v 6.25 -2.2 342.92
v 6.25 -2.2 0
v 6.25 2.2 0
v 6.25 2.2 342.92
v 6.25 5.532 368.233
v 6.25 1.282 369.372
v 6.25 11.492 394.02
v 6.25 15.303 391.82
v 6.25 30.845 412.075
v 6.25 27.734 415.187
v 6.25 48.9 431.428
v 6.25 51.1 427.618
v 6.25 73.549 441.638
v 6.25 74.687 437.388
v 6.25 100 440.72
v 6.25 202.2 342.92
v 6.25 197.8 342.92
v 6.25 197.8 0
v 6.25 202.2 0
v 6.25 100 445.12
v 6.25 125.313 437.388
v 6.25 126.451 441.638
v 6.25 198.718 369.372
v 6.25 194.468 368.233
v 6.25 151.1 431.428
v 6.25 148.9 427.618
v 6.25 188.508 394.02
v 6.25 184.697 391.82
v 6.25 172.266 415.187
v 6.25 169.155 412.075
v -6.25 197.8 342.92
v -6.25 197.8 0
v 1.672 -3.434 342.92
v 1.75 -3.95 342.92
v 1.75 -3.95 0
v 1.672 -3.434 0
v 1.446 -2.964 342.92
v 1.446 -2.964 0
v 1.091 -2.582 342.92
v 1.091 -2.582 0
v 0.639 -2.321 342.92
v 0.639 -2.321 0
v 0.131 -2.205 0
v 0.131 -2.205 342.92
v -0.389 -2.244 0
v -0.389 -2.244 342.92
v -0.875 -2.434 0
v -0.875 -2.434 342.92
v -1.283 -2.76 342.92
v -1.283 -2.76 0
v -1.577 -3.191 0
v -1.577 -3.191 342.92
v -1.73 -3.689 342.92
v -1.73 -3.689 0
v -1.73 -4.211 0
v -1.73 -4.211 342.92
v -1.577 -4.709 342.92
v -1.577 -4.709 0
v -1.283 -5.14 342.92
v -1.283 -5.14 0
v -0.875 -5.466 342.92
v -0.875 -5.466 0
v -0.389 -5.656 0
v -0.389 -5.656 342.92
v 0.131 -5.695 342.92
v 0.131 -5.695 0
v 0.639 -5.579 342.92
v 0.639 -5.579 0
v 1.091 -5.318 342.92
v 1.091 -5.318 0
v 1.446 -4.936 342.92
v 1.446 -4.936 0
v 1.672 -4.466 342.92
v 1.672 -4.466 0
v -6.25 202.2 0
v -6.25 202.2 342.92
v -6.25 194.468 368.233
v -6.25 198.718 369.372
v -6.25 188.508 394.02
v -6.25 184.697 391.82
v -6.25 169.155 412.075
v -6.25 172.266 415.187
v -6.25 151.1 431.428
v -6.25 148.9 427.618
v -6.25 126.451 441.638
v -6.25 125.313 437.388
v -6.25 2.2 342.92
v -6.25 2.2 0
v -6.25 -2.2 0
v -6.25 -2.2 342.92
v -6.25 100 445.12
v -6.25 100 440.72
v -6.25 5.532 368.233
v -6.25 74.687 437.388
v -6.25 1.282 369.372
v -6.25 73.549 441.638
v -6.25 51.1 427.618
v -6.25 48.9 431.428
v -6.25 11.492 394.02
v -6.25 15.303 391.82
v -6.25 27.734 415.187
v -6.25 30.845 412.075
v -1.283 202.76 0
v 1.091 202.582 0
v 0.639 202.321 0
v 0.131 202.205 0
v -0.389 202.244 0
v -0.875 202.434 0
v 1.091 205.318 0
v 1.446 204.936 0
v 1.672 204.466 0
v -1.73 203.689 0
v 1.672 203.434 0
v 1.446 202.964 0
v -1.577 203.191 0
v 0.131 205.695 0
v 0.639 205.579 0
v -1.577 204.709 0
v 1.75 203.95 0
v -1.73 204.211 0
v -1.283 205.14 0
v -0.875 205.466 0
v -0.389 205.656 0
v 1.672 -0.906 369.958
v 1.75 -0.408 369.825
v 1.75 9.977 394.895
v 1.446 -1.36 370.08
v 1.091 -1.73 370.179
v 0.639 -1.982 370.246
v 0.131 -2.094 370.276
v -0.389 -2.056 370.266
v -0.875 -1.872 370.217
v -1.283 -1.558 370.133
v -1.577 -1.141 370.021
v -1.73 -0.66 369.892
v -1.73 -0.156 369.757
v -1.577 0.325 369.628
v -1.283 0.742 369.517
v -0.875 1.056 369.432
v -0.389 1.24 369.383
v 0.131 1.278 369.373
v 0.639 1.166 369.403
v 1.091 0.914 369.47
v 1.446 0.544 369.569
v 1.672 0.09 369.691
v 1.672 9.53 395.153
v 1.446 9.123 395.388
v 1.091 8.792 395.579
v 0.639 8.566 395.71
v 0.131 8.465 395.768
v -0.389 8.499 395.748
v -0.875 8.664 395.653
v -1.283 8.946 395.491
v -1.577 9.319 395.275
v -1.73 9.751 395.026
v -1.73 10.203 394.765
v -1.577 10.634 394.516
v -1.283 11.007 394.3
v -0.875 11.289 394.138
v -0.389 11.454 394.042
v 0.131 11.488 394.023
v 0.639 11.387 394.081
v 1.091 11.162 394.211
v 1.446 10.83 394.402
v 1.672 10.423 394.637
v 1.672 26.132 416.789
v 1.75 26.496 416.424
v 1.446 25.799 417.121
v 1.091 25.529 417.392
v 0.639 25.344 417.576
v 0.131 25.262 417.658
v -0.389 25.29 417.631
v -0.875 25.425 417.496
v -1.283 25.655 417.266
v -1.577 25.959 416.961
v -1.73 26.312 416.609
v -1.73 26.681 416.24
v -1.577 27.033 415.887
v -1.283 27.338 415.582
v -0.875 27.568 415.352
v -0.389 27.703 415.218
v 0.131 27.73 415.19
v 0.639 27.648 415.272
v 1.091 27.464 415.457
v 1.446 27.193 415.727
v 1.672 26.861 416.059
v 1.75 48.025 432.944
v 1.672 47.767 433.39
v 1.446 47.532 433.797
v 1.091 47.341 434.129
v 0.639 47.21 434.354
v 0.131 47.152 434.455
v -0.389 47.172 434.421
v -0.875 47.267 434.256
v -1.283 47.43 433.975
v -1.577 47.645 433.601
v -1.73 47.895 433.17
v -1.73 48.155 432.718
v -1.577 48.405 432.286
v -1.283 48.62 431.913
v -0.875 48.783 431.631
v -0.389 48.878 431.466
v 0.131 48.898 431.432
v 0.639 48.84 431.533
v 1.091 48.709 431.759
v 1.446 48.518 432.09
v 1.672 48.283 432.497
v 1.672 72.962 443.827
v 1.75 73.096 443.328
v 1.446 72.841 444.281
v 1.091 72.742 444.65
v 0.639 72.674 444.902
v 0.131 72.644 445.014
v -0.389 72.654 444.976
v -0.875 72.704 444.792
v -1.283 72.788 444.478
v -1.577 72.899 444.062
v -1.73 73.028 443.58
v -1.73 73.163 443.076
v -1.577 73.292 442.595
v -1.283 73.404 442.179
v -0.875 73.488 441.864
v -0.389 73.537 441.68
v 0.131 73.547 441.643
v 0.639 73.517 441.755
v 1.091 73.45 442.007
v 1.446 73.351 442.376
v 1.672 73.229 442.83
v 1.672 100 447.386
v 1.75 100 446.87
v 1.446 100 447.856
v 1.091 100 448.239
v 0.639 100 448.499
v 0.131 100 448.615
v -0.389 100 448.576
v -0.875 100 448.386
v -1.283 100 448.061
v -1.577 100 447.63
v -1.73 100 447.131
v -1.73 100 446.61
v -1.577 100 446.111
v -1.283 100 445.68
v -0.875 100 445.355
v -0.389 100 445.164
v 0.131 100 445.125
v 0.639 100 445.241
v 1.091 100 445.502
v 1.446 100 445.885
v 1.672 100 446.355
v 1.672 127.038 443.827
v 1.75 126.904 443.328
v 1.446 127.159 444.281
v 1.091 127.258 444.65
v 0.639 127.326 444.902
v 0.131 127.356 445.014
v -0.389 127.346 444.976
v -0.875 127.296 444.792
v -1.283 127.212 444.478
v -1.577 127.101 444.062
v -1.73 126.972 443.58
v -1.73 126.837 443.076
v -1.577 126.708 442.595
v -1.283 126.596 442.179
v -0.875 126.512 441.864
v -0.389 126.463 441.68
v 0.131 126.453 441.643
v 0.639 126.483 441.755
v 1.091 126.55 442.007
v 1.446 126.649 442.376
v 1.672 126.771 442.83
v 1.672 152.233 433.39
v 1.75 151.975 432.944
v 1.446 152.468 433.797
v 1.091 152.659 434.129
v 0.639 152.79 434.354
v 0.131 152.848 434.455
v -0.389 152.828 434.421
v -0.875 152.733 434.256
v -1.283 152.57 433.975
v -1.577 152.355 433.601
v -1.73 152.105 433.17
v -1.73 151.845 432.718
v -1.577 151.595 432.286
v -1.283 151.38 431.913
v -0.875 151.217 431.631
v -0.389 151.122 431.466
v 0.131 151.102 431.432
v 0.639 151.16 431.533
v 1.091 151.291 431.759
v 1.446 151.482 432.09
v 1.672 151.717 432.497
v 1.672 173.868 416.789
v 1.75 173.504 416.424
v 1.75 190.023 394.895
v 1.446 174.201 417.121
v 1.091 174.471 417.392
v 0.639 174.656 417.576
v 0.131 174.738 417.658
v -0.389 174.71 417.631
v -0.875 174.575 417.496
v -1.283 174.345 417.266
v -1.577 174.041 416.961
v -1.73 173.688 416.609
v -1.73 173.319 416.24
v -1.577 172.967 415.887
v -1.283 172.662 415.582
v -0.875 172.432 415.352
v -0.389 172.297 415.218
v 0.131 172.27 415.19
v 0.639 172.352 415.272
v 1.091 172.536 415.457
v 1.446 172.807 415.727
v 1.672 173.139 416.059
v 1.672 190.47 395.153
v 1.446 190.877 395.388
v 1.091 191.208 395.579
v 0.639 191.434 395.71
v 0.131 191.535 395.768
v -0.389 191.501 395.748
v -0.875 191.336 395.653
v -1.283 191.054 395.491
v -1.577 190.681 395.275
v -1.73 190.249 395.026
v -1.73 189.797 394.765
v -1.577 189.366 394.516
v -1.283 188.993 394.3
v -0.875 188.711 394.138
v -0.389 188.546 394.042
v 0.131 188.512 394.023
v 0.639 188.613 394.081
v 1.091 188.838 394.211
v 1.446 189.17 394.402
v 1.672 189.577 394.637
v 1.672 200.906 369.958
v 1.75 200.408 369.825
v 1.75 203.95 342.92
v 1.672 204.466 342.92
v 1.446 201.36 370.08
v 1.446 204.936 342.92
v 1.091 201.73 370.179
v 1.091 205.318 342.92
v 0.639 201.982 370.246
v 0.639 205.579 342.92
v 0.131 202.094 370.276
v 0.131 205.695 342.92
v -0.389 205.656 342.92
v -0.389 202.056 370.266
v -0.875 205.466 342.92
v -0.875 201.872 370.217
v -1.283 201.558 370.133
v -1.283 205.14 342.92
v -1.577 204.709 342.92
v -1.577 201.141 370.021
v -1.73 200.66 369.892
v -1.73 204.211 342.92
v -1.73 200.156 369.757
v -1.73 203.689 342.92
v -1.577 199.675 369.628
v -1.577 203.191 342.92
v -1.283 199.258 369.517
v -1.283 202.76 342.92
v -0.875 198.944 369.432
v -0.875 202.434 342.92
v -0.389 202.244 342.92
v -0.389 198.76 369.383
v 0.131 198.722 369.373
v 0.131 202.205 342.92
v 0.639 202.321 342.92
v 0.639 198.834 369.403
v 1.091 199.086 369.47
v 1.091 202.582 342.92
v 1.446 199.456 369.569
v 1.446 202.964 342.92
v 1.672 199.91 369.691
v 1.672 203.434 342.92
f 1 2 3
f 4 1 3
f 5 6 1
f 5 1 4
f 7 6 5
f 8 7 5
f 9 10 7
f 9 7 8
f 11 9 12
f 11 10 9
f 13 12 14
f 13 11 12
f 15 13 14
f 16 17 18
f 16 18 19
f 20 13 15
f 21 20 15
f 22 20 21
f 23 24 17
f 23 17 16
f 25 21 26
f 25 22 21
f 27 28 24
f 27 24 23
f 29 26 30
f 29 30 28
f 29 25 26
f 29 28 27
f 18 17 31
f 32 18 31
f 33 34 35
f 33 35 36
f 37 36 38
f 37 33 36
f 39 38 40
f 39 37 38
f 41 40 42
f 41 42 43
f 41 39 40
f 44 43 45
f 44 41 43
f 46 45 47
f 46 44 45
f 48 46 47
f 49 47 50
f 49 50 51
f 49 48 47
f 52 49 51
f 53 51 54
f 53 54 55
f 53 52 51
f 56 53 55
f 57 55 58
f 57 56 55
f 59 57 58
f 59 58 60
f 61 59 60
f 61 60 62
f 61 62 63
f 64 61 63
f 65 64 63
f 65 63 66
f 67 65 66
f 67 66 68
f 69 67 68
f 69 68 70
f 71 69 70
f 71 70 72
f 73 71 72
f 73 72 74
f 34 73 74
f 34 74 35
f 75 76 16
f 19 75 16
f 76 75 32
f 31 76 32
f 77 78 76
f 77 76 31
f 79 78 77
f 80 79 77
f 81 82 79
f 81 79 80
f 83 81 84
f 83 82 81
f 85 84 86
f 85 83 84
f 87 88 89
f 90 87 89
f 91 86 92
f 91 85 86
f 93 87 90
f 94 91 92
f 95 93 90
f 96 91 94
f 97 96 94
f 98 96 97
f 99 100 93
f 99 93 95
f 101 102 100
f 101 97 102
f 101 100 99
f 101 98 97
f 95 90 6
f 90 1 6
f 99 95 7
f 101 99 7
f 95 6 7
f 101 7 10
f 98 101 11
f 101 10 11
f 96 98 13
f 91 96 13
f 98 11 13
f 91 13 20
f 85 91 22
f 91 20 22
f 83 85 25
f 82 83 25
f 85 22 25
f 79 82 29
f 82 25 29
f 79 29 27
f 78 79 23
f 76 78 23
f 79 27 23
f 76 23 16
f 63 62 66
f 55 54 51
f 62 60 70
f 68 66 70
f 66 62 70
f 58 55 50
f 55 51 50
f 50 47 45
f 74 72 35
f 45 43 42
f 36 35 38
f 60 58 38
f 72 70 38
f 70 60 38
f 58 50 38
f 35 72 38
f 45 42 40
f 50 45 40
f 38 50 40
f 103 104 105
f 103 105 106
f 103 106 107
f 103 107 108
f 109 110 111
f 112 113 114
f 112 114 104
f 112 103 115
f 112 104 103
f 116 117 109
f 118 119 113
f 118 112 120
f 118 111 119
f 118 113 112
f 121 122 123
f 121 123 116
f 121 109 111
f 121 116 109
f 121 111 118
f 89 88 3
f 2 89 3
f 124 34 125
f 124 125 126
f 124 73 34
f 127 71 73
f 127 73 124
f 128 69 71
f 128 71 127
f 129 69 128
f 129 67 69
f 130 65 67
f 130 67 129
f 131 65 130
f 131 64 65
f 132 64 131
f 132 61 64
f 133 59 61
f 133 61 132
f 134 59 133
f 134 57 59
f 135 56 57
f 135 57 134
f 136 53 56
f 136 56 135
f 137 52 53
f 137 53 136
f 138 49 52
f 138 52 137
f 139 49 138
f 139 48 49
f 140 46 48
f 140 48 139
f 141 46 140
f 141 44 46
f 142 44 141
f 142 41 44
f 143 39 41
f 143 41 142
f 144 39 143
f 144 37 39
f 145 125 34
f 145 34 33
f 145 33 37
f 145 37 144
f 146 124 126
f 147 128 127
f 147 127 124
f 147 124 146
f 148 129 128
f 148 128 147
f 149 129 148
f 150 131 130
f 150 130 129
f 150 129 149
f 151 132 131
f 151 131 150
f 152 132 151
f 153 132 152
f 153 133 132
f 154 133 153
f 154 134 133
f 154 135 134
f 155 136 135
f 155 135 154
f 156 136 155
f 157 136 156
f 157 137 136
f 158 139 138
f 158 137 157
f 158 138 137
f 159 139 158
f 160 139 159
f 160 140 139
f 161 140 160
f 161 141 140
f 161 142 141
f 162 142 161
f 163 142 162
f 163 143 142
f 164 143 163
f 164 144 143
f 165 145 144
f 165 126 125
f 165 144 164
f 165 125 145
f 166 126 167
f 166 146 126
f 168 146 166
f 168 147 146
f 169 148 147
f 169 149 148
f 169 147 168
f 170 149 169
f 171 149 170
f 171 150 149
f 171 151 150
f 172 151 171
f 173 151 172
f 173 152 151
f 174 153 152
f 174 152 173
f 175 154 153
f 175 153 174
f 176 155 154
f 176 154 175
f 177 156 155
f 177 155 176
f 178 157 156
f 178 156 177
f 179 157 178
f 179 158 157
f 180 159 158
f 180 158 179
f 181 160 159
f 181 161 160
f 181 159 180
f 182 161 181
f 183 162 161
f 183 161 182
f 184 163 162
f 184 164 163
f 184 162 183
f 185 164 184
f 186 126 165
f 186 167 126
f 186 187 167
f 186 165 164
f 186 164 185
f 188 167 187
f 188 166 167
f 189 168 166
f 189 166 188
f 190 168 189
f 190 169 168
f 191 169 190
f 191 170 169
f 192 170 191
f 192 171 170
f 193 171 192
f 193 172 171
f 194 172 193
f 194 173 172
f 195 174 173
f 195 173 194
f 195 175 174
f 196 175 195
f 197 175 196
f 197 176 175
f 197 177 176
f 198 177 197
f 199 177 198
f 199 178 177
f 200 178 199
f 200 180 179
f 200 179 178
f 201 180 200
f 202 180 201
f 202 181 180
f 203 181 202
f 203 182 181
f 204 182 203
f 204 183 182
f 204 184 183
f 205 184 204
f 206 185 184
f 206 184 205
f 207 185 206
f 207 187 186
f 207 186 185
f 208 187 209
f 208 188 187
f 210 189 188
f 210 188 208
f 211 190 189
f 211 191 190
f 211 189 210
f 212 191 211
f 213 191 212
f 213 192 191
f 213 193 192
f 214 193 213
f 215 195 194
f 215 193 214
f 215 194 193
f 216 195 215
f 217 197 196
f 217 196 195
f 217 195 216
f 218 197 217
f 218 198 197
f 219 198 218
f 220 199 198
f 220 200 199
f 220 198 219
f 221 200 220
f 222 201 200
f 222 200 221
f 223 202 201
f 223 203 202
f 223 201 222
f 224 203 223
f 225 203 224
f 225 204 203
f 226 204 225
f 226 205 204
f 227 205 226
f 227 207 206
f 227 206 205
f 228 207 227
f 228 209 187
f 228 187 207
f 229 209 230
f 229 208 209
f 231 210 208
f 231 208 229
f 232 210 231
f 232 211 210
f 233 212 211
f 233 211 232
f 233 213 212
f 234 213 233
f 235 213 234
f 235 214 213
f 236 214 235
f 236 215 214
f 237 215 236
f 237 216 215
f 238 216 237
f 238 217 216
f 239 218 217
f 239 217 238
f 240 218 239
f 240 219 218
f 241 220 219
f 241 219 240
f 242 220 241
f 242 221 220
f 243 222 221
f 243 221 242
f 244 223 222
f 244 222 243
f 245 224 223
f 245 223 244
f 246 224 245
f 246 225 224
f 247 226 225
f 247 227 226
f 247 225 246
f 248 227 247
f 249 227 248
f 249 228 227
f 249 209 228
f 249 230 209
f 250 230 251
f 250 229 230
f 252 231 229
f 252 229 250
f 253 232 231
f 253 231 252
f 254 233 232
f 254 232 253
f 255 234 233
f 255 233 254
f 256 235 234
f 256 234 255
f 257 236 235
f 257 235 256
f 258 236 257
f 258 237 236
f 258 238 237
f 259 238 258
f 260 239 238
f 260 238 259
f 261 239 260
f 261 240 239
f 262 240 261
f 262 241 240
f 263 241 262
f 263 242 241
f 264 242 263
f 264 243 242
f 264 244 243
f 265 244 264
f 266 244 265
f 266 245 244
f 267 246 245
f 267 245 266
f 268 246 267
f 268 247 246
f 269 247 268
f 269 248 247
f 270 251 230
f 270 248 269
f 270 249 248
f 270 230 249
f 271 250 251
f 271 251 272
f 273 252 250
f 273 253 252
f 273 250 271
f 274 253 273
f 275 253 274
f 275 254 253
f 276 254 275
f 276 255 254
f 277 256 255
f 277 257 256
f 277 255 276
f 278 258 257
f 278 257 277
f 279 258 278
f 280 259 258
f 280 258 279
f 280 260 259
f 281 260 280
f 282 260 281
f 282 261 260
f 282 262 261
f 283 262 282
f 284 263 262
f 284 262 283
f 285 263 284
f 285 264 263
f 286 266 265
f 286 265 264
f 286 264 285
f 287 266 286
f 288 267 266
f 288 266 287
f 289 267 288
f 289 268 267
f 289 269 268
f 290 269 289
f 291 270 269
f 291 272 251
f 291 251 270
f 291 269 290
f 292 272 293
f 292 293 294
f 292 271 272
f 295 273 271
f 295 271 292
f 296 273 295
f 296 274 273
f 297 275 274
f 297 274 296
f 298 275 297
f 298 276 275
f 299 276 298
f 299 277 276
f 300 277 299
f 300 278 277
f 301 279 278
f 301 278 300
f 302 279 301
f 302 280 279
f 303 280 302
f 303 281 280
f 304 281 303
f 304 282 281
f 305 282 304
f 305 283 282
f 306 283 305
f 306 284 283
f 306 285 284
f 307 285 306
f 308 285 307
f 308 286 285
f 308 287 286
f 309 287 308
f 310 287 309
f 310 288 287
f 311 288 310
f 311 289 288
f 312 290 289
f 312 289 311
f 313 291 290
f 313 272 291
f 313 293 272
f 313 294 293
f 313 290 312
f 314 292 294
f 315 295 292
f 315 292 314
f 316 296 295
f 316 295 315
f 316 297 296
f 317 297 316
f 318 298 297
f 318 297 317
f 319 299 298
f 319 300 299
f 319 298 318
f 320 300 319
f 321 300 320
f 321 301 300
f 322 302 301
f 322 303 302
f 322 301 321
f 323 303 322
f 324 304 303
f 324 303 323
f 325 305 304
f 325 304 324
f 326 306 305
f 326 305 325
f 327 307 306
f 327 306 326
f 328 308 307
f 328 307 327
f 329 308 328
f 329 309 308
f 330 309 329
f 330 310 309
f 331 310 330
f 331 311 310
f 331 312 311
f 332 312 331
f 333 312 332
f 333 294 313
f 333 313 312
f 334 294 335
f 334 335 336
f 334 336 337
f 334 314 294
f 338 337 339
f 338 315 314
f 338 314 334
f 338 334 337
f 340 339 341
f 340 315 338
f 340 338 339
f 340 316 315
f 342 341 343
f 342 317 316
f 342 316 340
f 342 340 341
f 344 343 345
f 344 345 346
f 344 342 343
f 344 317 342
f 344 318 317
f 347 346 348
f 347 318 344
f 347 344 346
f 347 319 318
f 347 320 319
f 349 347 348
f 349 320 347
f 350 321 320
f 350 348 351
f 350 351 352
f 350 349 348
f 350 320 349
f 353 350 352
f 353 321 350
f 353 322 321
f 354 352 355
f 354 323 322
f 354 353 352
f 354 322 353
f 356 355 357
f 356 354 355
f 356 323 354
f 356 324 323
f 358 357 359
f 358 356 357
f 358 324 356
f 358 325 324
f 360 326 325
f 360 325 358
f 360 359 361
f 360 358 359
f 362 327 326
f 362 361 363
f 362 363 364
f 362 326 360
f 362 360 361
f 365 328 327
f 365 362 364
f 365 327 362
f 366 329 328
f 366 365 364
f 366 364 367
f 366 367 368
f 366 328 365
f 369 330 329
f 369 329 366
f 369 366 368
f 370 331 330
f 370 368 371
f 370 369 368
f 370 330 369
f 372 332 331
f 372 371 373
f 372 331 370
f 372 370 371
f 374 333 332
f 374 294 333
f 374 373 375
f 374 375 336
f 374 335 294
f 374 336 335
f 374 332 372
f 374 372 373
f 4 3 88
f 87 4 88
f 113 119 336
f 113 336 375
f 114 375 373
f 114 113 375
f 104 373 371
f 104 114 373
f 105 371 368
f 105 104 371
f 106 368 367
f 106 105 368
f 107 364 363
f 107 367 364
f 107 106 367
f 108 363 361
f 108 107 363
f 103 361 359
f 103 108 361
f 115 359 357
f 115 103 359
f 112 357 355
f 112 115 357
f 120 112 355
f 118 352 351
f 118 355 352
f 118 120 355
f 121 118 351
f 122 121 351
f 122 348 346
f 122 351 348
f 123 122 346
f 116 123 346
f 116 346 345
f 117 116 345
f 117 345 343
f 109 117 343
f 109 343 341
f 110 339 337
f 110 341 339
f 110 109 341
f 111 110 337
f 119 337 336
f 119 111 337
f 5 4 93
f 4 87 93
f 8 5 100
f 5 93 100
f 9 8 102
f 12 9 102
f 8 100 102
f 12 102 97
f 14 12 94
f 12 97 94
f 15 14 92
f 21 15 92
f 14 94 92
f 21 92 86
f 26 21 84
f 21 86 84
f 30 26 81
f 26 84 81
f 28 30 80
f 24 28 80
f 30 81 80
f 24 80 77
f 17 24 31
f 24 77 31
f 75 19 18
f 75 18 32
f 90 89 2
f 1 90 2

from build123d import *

# Parameters (mm, degrees)
SKETCH1_W = 12.5
SKETCH1_H = 4.4
SKETCH2_R = 1.75


with BuildPart() as part:
    # Sweep1: sweep along a path in Sketch3
    with BuildLine(Plane(origin=(0, 0, 0), x_dir=(0, 0, -1), z_dir=(1, 0, 0))) as sweep1_path:
        Line((0, 0), (-342.920367321, 0))
        ThreePointArc((-342.920367321, 0), (-442.920367321, 100), (-342.920367321, 200))
        Line((-342.920367321, 200), (0, 200))
    # Sketch1 → Sweep1 (sweep)
    with BuildSketch(Plane.XY):
        Rectangle(SKETCH1_W, SKETCH1_H)
    sweep(path=sweep1_path.line)


with BuildPart() as body_2:
    # Sweep2: sweep along a path in Sketch3<2>
    with BuildLine(Plane(origin=(0, 0, 0), x_dir=(0, 0, -1), z_dir=(1, 0, 0))) as sweep2_path:
        Line((0, 0), (-342.920367321, 0))
        ThreePointArc((-342.920367321, 0), (-442.920367321, 100), (-342.920367321, 200))
        Line((-342.920367321, 200), (0, 200))
    # Sketch2 → Sweep2 (sweep)
    with BuildSketch(Plane.XY):
        with Locations((0, -3.95)):
            Circle(SKETCH2_R)
    sweep(path=sweep2_path.line)


solid = Compound([part.part, body_2.part])
